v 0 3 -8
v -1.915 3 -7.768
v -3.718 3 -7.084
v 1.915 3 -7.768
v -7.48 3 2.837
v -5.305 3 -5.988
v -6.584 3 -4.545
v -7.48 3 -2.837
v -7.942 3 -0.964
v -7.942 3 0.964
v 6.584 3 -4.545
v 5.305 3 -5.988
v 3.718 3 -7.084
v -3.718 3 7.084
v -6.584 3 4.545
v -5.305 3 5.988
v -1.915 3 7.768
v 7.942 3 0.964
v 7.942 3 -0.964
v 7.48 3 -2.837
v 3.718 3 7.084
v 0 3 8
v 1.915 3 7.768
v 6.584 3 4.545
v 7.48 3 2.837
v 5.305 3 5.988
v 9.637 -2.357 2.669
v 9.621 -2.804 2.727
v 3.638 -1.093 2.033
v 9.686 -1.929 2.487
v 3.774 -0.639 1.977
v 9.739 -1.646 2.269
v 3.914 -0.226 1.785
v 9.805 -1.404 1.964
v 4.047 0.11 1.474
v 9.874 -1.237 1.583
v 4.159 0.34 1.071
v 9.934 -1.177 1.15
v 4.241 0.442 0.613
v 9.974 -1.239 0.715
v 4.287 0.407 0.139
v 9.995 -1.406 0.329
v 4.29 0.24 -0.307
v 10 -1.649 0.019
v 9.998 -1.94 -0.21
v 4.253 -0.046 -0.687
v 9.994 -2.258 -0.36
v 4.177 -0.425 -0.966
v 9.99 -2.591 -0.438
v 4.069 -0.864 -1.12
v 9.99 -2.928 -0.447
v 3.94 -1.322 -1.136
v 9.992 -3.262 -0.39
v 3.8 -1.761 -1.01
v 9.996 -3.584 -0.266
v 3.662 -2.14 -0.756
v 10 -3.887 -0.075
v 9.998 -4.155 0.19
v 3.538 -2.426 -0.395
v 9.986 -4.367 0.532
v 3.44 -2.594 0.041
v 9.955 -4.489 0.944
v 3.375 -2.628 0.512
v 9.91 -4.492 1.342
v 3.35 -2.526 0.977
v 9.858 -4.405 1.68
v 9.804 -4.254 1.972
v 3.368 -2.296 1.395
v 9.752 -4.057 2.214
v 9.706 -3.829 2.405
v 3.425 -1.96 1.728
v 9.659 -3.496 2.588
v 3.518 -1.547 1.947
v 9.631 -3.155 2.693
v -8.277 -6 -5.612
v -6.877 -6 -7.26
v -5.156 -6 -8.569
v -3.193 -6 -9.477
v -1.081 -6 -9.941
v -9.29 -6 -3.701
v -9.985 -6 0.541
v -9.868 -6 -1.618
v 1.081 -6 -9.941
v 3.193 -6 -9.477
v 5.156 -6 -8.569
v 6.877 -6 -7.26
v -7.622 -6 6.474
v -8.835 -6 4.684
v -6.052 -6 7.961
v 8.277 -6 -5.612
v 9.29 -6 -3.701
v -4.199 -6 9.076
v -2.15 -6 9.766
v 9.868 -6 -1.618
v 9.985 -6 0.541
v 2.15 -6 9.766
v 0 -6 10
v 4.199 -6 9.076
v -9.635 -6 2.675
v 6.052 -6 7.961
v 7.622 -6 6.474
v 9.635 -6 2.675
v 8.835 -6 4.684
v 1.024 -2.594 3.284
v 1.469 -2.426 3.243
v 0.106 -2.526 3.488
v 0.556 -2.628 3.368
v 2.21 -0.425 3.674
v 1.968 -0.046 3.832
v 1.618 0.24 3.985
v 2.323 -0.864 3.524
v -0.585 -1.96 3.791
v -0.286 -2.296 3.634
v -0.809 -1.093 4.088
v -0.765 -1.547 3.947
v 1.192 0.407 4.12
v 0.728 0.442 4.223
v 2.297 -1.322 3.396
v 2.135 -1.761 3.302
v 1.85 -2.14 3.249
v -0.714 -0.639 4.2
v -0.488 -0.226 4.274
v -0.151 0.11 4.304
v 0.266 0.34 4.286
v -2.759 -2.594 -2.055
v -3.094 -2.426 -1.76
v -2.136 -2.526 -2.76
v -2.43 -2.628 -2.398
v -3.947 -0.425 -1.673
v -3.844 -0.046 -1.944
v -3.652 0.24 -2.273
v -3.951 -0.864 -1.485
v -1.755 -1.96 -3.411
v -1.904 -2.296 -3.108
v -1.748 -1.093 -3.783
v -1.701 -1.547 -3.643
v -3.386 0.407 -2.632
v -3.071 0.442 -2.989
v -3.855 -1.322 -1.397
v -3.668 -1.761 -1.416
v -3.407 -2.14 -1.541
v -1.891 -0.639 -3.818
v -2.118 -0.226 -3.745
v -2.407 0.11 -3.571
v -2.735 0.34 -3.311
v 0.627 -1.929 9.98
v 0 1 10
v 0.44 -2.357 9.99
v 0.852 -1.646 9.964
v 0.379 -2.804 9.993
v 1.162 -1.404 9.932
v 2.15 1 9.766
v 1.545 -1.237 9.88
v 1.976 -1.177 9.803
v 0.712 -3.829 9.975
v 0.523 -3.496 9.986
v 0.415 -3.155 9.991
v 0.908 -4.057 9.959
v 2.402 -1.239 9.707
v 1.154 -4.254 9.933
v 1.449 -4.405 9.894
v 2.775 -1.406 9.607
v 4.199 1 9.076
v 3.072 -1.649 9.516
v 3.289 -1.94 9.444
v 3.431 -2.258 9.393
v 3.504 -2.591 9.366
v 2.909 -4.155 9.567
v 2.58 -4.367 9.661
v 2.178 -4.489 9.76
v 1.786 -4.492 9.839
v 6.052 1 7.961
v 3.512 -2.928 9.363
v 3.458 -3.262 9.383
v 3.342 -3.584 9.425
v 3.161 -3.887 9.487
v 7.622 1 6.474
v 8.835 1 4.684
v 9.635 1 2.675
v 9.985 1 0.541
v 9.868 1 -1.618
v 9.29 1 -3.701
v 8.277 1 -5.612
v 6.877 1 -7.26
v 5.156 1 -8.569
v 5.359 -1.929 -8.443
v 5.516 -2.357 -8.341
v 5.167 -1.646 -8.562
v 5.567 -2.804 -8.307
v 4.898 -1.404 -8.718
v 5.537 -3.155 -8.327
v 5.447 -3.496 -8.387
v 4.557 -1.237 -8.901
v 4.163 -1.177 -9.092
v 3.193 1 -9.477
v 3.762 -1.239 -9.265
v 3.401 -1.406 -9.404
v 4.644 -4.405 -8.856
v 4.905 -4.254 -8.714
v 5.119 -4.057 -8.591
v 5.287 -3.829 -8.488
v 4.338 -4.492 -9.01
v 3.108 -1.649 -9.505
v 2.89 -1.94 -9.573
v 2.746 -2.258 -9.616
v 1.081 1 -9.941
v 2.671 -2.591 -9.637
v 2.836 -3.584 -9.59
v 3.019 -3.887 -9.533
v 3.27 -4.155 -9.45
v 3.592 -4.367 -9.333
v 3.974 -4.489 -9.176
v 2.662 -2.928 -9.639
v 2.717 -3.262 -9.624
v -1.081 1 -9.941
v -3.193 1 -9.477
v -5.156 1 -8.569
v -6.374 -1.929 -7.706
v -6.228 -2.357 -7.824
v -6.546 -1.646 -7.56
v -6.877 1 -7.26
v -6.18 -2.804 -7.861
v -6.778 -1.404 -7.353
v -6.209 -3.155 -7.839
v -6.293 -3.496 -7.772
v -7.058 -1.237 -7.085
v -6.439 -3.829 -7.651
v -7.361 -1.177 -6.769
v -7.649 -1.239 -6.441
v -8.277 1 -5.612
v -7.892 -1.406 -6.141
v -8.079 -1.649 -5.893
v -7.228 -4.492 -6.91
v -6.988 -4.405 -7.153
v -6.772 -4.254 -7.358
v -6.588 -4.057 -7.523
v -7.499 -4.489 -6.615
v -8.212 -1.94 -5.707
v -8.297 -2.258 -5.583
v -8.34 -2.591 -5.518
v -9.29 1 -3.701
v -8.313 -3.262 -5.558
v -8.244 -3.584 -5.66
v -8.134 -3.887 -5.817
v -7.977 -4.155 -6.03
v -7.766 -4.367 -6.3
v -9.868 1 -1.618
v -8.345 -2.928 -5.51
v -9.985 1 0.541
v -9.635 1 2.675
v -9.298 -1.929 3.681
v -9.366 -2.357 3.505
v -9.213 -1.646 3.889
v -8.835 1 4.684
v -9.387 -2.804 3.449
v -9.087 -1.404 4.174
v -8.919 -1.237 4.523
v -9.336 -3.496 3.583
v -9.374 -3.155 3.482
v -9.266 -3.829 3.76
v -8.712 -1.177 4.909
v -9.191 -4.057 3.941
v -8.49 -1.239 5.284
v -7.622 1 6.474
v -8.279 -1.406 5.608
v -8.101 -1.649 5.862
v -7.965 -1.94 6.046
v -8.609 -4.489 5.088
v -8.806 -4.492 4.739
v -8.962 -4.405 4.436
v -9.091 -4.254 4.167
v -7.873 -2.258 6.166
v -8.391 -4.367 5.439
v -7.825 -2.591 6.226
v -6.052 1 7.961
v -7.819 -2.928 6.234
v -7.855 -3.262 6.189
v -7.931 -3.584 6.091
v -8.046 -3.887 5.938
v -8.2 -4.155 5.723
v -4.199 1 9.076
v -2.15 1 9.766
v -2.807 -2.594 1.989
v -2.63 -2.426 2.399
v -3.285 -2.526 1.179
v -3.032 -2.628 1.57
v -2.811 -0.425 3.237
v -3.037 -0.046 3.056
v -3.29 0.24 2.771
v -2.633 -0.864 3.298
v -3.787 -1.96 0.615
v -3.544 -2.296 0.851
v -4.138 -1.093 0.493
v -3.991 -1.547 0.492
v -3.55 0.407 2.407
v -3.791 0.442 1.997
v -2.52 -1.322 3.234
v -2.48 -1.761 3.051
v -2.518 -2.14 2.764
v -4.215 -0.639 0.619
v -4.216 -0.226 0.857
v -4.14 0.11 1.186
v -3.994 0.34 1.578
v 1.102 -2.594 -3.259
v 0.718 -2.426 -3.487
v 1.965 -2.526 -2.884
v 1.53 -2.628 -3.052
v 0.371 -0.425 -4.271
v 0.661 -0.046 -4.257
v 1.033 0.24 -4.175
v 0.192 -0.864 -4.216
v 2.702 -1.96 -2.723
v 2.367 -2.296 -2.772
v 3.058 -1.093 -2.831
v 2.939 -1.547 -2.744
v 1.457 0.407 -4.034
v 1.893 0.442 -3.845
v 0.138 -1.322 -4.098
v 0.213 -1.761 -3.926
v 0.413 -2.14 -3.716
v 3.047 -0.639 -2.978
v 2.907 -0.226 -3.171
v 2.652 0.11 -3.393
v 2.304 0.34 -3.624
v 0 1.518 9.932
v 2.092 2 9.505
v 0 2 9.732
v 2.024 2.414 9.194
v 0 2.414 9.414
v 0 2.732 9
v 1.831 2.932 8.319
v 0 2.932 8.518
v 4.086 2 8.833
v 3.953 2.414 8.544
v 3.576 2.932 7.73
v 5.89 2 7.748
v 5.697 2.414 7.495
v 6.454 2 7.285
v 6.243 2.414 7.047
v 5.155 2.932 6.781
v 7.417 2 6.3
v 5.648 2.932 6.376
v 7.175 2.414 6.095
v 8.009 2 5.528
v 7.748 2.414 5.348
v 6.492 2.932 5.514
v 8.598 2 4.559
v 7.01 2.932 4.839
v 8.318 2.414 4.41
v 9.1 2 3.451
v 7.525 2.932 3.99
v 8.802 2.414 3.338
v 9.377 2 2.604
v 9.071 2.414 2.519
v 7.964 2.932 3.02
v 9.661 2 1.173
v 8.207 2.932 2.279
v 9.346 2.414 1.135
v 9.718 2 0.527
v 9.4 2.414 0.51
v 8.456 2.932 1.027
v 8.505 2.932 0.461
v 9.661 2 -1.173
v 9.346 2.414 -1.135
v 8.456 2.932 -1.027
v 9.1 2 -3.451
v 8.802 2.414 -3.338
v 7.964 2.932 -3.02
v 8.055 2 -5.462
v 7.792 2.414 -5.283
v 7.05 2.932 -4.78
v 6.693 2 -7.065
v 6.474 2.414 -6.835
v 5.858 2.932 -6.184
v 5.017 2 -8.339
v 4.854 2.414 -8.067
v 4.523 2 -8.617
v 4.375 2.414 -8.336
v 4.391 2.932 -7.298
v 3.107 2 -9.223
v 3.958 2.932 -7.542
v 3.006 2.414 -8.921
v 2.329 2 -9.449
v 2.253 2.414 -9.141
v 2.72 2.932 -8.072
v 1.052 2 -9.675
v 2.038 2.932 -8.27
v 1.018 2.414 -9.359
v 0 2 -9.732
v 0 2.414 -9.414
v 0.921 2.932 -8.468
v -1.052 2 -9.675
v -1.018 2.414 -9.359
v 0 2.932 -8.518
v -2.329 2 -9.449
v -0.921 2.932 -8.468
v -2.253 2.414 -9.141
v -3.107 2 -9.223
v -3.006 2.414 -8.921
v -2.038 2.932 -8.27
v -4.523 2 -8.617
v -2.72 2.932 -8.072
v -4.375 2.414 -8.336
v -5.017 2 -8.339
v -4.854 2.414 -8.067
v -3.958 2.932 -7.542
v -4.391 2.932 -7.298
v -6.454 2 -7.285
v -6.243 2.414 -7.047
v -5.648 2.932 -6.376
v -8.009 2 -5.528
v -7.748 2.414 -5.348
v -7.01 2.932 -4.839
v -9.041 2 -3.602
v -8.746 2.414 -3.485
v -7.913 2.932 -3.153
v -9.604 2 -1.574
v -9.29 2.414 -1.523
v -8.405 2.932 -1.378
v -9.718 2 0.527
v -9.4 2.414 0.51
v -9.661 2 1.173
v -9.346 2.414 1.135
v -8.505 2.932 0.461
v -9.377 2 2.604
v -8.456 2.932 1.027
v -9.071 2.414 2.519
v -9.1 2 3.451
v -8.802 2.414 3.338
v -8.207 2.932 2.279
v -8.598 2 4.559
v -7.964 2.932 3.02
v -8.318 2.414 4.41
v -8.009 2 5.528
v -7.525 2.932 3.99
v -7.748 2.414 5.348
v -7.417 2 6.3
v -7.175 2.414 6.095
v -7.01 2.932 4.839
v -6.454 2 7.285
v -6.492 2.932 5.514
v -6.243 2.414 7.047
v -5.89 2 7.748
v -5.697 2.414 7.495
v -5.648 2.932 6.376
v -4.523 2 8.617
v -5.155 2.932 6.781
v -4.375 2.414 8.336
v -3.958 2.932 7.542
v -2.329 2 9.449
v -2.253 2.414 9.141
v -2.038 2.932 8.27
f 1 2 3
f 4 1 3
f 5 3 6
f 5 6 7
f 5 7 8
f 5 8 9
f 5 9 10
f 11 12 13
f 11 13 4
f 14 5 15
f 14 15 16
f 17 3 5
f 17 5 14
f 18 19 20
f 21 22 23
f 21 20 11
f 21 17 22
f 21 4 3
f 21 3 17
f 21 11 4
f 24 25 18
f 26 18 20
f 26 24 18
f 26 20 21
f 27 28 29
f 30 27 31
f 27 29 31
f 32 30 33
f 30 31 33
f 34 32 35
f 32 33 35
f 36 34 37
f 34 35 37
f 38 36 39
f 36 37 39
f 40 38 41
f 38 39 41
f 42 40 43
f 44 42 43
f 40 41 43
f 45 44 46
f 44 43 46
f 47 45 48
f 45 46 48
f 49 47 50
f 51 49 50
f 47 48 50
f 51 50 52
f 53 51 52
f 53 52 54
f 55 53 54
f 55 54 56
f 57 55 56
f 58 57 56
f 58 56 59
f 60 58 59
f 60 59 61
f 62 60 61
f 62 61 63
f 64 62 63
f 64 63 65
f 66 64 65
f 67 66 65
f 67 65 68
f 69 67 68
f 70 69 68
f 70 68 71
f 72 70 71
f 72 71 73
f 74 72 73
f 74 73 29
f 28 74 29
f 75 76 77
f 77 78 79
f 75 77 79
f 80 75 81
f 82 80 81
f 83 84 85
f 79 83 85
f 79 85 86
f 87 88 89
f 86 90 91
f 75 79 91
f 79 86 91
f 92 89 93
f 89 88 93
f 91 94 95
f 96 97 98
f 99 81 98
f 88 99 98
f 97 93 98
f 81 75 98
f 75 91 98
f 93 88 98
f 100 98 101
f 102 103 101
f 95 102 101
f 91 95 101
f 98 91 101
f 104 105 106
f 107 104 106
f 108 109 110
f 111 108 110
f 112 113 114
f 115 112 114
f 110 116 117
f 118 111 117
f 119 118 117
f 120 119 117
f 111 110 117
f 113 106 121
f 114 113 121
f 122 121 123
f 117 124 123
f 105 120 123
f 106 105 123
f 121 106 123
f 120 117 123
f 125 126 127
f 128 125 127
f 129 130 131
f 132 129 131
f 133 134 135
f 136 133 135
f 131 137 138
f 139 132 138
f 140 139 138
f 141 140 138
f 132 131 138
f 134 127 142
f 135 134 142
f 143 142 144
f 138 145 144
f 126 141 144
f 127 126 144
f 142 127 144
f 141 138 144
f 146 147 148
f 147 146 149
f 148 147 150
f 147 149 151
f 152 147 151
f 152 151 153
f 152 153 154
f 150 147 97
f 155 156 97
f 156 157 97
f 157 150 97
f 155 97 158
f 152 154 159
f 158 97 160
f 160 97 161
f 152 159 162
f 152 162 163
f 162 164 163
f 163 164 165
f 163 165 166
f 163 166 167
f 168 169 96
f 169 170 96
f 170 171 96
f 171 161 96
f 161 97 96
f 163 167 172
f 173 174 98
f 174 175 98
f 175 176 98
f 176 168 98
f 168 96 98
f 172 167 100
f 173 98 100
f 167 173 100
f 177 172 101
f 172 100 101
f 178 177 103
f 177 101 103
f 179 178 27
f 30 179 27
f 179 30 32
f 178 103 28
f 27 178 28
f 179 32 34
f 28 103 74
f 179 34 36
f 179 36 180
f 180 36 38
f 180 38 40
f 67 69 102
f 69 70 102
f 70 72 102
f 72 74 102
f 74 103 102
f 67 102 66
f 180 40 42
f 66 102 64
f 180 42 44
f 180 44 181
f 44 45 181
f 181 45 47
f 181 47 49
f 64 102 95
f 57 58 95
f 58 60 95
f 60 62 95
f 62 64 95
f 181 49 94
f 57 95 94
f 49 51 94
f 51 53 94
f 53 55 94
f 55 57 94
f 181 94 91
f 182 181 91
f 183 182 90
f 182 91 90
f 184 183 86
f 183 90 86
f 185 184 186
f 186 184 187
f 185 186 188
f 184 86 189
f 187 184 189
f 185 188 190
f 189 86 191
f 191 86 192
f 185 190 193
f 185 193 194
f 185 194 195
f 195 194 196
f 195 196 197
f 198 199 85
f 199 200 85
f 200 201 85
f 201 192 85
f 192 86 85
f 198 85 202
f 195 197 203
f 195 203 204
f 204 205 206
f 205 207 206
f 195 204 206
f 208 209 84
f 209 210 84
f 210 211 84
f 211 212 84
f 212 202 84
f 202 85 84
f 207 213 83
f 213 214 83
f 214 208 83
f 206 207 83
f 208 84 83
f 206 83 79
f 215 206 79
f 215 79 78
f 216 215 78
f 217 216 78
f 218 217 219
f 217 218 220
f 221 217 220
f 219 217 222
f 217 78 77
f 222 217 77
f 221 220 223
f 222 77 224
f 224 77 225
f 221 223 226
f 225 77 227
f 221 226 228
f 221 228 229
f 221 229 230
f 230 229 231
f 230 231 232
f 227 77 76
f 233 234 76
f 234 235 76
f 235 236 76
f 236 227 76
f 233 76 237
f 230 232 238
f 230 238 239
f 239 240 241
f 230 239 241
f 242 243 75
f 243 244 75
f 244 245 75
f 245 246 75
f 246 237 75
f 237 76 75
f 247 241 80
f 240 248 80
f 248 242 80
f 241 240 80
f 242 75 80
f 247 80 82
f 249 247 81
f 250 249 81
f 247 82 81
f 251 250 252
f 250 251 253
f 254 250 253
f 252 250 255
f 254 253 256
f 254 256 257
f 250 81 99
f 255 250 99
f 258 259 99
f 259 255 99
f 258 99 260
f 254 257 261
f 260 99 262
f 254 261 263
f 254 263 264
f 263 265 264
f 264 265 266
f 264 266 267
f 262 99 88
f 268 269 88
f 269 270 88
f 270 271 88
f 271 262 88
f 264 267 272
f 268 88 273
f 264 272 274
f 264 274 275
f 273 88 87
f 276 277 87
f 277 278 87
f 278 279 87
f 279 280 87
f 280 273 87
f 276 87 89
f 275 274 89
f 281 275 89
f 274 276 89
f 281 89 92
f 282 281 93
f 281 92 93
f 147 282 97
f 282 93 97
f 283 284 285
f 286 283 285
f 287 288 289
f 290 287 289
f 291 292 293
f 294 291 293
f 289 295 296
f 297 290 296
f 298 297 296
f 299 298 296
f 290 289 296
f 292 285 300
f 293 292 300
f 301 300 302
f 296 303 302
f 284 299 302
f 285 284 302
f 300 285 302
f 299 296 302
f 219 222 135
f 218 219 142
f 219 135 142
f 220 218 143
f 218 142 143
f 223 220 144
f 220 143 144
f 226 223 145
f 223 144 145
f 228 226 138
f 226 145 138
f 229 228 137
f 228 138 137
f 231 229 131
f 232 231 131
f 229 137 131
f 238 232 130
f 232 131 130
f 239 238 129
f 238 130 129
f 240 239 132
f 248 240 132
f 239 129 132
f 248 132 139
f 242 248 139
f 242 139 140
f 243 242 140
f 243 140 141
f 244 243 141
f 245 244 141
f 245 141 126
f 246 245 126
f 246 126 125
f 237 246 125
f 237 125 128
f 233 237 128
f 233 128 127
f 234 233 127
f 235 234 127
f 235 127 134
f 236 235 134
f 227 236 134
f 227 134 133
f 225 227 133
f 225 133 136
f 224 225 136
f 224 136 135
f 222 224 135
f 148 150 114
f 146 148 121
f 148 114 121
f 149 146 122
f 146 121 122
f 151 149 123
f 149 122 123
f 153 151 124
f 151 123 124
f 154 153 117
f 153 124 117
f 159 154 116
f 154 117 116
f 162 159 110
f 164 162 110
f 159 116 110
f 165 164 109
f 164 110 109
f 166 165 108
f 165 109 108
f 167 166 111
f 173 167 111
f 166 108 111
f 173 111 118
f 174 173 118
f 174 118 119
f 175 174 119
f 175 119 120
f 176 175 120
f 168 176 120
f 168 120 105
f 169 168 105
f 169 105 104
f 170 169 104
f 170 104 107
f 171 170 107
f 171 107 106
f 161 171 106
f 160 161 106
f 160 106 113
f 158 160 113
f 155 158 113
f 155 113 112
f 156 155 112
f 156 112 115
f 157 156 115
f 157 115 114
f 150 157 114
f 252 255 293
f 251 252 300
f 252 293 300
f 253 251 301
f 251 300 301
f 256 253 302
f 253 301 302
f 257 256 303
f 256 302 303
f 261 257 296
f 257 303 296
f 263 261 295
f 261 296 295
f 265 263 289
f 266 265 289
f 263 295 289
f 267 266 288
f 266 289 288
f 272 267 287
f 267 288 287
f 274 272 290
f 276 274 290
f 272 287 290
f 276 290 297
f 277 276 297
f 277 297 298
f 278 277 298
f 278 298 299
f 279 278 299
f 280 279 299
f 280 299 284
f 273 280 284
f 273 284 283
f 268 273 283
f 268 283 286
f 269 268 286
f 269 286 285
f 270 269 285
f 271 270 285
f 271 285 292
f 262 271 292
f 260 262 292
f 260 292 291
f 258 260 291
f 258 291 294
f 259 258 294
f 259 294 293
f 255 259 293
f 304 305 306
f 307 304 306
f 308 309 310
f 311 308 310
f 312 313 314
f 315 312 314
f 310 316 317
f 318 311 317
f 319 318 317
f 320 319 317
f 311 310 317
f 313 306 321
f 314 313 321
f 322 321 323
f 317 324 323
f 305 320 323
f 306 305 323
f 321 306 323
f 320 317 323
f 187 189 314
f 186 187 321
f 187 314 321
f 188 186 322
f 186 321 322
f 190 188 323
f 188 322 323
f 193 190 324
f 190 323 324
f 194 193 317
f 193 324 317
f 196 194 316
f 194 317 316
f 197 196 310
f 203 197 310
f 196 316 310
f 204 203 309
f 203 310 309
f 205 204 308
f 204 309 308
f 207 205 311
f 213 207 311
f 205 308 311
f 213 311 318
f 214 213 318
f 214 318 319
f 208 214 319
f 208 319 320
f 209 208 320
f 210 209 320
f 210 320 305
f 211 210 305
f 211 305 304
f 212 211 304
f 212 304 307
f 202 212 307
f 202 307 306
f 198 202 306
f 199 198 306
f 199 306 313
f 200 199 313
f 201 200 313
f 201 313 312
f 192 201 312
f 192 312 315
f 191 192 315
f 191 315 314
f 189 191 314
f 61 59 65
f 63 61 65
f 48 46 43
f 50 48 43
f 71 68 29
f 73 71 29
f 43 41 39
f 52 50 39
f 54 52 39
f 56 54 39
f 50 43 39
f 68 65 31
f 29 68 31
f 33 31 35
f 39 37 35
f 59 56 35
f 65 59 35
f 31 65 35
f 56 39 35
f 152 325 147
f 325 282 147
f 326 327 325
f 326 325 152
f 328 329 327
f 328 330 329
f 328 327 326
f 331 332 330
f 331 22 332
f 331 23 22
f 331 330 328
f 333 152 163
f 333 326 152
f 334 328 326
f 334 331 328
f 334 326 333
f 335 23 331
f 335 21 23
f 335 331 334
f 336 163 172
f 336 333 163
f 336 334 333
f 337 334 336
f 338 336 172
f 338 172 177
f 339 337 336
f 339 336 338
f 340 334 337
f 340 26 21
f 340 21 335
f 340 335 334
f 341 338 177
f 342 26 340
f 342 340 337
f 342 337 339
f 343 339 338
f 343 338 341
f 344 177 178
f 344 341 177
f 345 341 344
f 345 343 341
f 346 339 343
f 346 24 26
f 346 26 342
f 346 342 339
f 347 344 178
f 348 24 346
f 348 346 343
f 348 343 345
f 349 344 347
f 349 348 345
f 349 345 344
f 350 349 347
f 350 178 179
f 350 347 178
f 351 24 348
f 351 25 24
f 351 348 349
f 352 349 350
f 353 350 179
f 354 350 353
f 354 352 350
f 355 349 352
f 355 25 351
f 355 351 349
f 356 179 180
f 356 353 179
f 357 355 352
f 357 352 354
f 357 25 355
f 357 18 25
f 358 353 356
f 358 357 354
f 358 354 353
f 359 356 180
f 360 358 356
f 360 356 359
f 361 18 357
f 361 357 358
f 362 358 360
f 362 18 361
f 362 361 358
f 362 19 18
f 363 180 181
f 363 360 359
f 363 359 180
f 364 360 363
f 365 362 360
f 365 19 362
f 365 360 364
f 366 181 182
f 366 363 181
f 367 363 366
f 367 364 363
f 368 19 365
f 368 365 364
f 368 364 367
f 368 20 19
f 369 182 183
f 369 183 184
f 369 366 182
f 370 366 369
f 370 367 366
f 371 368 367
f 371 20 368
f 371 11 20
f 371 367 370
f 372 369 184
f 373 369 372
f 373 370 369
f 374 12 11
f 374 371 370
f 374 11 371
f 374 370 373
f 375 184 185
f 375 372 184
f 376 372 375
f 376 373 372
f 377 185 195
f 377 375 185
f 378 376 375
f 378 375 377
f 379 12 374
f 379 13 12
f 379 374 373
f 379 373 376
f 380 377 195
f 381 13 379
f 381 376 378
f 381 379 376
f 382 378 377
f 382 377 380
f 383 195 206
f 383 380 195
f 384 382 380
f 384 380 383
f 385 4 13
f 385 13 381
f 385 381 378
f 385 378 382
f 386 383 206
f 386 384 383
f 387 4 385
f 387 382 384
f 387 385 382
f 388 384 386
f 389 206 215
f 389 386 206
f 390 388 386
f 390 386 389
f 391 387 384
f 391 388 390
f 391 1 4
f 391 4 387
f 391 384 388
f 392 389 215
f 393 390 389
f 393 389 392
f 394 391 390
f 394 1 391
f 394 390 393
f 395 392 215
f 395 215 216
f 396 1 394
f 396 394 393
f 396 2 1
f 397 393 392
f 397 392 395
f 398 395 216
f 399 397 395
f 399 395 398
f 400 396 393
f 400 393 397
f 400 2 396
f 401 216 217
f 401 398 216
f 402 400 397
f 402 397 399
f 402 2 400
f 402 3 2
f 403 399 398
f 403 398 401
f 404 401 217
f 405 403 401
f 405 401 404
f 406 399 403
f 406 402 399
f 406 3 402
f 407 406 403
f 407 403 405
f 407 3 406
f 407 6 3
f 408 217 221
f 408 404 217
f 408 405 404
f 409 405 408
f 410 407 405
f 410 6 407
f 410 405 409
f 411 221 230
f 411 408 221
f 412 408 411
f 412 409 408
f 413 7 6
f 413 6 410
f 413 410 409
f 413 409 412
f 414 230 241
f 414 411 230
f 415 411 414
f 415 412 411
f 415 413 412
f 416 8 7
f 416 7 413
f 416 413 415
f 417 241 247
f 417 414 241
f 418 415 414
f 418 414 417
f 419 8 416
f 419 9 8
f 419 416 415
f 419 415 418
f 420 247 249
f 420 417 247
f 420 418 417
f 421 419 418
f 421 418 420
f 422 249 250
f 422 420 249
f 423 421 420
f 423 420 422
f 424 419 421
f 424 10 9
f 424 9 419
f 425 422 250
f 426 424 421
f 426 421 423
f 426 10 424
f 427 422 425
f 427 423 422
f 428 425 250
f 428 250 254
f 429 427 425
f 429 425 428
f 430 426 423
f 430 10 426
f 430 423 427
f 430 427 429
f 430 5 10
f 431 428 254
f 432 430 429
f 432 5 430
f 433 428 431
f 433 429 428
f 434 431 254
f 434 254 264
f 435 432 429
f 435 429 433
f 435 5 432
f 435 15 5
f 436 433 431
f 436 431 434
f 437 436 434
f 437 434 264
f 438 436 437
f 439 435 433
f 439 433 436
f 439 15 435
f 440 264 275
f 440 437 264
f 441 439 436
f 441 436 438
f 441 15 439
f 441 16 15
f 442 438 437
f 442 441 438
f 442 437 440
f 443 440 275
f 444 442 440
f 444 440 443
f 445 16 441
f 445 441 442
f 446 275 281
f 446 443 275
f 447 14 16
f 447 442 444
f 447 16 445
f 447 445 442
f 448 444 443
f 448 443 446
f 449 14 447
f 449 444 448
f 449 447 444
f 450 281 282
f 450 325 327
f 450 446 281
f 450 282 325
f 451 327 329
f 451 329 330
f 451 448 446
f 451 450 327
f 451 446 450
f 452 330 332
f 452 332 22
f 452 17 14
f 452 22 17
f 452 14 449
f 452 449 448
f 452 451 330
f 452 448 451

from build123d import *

# Parameters (mm, degrees)
BOSS_EXTRUDE1_DEPTH      = 3
BOSS_EXTRUDE1_DEPTH_BACK = 6
SKETCH1_R                = 10
SKETCH4_R                = 1.6
HOLE_DEPTH               = 19.539009706
HOLECIR_COUNT            = 5
FILLET3_R                = 2


with BuildPart() as part:
    # Sketch1 → Boss-Extrude1 (new, two sides: drawn at the far end of the back side and taken through both)
    with BuildSketch(Plane(origin=(0, 0, 0), x_dir=(1, 0, 0), z_dir=(0, 1, 0)).offset(-BOSS_EXTRUDE1_DEPTH_BACK)):
        Circle(SKETCH1_R)
    extrude(amount=BOSS_EXTRUDE1_DEPTH + BOSS_EXTRUDE1_DEPTH_BACK)

    # Sketch4 → hole (cut, through all)
    with BuildSketch(Plane(origin=(-3.352872105, -1.093066116, 1.887711608), x_dir=(-0.4486862613641547, -0.14627571033740308, -0.8816371449912632), z_dir=(0.8382180262940947, 0.2732665289126682, -0.47192790187872385))):
        Circle(SKETCH4_R)
    hole = extrude(amount=-HOLE_DEPTH, mode=Mode.SUBTRACT)

    # holecir: hole ×5 about axis
    holecir_axis = Axis((0, 5.5, 0), (0, -1, 0))
    for i in range(1, HOLECIR_COUNT):
        add(hole.rotate(holecir_axis, i * 360 / HOLECIR_COUNT), mode=Mode.SUBTRACT)

    # Fillet3
    fillet3_edges = [part.edges().sort_by_distance(p)[0] for p in [
        (-10, 3, 0),
    ]]
    fillet(fillet3_edges, radius=FILLET3_R)


solid = part.part
